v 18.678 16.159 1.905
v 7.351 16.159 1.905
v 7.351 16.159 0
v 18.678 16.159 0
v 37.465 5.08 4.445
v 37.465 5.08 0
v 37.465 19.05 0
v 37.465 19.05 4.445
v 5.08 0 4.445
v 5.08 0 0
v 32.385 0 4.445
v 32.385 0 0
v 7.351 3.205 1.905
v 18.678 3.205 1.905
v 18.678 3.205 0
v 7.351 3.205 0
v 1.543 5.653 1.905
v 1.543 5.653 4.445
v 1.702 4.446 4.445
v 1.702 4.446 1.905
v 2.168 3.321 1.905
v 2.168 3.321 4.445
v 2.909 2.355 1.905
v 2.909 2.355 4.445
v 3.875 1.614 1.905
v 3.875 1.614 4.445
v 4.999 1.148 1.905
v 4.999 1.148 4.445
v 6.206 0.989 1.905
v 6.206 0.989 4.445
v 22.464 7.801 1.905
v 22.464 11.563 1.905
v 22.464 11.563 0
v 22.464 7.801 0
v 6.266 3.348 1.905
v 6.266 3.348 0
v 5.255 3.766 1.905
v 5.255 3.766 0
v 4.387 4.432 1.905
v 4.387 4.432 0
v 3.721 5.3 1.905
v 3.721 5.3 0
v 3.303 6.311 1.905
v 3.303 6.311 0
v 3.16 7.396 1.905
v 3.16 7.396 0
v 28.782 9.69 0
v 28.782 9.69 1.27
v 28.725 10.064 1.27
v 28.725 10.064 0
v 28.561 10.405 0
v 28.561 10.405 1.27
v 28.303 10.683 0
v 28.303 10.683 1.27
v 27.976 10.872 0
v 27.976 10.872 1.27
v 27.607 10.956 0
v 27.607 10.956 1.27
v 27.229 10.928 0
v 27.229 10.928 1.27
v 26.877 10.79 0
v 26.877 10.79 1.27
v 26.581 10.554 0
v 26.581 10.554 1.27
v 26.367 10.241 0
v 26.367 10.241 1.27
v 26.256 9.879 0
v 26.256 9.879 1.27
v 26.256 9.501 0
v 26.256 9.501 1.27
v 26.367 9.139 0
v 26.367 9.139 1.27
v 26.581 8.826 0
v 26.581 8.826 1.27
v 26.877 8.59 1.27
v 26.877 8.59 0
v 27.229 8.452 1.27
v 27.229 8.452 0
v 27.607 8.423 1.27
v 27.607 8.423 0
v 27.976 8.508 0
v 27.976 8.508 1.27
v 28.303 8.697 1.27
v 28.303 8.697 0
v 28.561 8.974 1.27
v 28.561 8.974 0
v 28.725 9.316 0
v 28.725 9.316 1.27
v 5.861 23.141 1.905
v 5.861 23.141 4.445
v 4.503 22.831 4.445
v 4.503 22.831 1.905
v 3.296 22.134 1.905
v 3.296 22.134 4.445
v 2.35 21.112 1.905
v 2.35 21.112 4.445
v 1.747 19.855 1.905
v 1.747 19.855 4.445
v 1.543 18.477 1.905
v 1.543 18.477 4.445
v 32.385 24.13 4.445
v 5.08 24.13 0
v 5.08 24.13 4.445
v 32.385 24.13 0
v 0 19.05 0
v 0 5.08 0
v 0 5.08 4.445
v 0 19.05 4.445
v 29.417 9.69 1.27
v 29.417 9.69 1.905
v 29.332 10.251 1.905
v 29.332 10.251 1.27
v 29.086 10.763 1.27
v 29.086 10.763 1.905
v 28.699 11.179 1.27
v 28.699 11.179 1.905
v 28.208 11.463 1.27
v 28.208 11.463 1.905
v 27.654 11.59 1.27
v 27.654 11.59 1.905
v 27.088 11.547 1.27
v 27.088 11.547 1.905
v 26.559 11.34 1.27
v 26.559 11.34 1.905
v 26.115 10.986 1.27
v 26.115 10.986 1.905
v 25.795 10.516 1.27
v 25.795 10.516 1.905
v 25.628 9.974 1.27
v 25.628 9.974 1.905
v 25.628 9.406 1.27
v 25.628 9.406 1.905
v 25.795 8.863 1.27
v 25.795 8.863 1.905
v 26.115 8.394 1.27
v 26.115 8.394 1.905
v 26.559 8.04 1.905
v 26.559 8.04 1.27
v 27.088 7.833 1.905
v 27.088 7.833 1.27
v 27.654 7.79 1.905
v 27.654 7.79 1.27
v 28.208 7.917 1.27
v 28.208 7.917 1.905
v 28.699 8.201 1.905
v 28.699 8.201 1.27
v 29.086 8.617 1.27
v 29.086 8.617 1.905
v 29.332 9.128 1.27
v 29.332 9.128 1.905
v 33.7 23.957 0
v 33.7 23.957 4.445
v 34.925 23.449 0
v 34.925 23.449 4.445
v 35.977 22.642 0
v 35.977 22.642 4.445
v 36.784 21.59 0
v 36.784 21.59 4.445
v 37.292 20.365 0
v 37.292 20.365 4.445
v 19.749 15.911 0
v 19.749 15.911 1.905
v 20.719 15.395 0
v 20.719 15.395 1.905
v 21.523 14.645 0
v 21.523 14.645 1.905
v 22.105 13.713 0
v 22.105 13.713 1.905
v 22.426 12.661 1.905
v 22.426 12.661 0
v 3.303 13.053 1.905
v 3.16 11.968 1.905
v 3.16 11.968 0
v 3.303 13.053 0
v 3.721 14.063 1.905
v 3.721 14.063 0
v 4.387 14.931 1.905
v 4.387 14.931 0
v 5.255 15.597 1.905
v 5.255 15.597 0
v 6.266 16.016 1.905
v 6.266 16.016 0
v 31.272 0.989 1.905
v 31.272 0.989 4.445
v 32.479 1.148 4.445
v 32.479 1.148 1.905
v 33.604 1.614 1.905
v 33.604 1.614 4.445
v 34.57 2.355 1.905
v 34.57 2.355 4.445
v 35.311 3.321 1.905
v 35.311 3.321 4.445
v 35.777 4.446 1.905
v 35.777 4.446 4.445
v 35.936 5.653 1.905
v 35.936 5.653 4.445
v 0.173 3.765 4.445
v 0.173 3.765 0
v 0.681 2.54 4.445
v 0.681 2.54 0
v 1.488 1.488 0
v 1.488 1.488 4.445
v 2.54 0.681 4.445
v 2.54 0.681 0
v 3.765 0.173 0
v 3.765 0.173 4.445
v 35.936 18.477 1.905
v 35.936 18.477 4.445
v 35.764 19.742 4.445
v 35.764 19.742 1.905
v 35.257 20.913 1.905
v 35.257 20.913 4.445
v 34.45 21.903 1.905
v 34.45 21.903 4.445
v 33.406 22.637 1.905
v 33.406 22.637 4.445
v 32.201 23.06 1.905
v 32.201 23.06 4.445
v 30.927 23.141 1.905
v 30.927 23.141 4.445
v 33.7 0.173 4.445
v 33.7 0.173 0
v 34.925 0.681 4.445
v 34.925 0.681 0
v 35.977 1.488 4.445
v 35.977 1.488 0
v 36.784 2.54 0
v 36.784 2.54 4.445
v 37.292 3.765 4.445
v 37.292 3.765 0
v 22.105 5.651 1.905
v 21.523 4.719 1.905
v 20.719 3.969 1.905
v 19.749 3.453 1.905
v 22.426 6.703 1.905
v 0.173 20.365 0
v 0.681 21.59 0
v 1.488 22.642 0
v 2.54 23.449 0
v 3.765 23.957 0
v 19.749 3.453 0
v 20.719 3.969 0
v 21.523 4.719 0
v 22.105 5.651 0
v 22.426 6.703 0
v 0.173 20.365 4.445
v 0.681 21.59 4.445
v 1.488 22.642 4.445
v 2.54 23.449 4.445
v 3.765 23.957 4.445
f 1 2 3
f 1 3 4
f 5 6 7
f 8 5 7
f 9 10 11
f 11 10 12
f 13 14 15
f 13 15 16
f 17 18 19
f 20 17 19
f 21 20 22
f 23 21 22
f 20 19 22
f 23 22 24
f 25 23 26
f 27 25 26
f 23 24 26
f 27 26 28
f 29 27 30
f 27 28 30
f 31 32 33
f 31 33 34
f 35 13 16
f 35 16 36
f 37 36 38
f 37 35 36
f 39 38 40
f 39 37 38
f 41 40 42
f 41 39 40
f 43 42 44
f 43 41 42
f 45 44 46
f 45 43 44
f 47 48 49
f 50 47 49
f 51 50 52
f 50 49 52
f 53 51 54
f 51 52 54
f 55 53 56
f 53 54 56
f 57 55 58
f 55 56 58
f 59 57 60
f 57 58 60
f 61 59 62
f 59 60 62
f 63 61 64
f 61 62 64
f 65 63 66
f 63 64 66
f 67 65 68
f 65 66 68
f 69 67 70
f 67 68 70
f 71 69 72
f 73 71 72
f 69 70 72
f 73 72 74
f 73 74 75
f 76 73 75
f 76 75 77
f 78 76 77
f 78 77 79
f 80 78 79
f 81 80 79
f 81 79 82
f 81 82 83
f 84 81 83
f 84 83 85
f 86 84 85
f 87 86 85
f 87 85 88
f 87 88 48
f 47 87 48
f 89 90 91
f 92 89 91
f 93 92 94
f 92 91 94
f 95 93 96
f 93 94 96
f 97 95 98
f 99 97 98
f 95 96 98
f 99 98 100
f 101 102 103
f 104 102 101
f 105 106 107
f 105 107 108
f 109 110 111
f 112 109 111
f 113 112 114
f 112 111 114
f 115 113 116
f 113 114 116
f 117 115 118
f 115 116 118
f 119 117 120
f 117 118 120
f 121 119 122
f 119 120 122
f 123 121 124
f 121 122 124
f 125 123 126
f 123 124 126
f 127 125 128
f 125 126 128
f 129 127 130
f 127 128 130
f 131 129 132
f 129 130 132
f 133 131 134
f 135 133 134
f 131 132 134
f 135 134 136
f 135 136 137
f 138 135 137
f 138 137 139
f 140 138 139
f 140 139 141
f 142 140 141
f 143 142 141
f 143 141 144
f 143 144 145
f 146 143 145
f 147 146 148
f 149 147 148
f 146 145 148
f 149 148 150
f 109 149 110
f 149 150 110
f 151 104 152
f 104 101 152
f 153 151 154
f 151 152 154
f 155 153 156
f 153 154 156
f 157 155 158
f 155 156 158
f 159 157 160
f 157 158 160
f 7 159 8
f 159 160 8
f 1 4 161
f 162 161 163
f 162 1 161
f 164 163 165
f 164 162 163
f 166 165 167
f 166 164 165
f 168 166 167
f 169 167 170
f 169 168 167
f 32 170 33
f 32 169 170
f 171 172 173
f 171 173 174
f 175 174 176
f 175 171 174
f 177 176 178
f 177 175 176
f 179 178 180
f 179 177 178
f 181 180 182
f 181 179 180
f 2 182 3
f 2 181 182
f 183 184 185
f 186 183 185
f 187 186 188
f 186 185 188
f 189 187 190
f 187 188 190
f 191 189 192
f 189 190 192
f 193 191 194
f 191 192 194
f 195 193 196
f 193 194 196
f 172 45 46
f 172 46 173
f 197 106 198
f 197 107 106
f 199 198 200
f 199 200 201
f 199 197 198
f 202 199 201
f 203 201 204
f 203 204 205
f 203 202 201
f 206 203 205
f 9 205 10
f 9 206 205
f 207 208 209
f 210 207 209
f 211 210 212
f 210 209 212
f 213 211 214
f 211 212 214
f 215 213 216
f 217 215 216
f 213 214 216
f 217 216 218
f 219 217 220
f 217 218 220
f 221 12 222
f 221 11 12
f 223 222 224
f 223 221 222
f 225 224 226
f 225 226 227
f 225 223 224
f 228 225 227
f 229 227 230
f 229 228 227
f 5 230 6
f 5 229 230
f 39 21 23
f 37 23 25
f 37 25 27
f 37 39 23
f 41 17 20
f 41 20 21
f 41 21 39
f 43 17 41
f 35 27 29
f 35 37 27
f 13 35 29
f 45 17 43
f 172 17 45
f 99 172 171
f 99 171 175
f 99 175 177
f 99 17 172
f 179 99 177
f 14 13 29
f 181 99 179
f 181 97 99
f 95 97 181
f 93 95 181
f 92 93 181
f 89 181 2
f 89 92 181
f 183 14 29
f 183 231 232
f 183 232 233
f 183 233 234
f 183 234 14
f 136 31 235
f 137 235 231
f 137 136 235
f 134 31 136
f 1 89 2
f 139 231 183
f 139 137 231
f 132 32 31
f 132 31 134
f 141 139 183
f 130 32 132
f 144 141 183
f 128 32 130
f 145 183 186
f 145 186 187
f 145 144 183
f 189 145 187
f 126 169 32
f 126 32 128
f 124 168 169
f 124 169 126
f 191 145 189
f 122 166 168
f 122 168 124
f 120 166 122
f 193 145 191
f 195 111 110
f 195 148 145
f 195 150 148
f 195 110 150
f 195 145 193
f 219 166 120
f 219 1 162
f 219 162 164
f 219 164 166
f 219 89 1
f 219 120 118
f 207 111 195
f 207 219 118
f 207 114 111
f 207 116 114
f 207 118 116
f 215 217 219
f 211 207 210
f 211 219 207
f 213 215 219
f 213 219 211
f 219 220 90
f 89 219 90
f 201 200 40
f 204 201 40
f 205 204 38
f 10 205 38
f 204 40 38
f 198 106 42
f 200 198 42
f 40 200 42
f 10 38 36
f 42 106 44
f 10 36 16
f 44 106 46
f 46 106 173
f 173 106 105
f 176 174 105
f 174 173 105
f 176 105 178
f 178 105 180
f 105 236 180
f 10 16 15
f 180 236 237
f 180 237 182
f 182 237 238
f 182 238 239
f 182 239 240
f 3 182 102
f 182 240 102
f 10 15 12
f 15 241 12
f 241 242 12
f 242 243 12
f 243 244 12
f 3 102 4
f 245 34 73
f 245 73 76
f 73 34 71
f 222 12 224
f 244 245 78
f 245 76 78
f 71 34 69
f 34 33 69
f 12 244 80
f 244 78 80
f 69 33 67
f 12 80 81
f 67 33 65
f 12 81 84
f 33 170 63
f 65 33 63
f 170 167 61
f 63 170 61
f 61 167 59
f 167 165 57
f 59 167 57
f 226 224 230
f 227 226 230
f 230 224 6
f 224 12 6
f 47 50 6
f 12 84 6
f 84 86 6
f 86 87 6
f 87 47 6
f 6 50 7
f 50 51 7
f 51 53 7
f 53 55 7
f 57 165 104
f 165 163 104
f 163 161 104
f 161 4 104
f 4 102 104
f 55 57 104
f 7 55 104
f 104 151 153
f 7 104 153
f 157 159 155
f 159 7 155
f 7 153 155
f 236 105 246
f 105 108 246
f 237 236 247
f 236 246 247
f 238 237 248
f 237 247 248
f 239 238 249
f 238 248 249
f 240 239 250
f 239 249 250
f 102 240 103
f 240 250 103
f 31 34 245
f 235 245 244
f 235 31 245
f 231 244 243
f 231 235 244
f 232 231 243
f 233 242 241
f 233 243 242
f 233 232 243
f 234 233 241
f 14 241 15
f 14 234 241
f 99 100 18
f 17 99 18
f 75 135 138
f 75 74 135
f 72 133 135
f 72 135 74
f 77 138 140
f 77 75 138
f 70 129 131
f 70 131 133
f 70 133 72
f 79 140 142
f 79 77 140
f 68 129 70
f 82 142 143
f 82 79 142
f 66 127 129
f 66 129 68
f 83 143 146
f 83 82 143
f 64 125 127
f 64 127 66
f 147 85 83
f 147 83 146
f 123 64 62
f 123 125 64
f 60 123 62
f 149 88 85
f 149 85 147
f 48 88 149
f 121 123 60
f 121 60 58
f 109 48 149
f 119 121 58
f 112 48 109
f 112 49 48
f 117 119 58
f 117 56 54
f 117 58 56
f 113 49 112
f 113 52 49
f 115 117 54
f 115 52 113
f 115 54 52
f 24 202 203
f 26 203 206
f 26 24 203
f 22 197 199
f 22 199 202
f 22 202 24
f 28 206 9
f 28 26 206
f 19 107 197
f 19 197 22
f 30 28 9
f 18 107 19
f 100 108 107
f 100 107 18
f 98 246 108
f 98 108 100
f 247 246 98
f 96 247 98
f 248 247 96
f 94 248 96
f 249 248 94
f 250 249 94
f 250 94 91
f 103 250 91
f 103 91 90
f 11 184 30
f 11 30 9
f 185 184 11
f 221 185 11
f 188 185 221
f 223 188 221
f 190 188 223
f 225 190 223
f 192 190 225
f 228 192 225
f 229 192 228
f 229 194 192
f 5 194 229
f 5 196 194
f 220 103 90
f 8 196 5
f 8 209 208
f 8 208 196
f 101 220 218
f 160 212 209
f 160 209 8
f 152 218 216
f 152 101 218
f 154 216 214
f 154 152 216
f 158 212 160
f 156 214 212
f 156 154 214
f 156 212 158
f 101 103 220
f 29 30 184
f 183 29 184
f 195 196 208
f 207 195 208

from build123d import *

# Parameters (mm, degrees)
SKETCH1_W           = 37.465
SKETCH1_H           = 24.13
BOSS_EXTRUDE1_DEPTH = 4.445
CUT_EXTRUDE2_DEPTH  = 2.54
FILLET1_R           = 5.08
CUT_EXTRUDE4_DEPTH  = 2.54
SKETCH4_R           = 1.27
CUT_EXTRUDE5_DEPTH  = 2.54
SKETCH5_R           = 1.905
SKETCH5_R_2         = 1.27
CUT_EXTRUDE6_DEPTH  = 0.635
CUT_EXTRUDE7_DEPTH  = 2.54


with BuildPart() as part:
    # Sketch1 → Boss-Extrude1 (new body)
    with BuildSketch(Plane.XY):
        with Locations((18.7325, 12.065)):
            Rectangle(SKETCH1_W, SKETCH1_H)
    extrude(amount=BOSS_EXTRUDE1_DEPTH)

    # Sketch2 → Cut-Extrude2 (cut)
    # profile 1 of 4: a face of its own
    with BuildSketch(Plane.XY.offset(4.445)):
        with BuildLine():
            Line((35.59175, 5.7785), (35.59175, 12.065))
            Line((35.59175, 12.065), (35.59175, 18.3515))
            ThreePointArc((35.59175, 18.3515), (34.135361545, 21.710109865), (30.681521372, 22.9235))
            Line((30.681521372, 22.9235), (18.7325, 22.9235))
            Line((18.7325, 22.9235), (6.107021372, 22.9235))
            ThreePointArc((6.107021372, 22.9235), (3.090639267, 21.470453234), (1.87325, 18.3515))
            Line((1.87325, 18.3515), (1.87325, 12.065))
            Line((1.87325, 12.065), (1.87325, 5.7785))
            ThreePointArc((1.87325, 5.7785), (3.212357796, 2.545607796), (6.44525, 1.2065))
            Line((6.44525, 1.2065), (18.7325, 1.2065))
            Line((18.7325, 1.2065), (31.01975, 1.2065))
            ThreePointArc((31.01975, 1.2065), (34.252642204, 2.545607796), (35.59175, 5.7785))
        make_face()
        with BuildLine():
            ThreePointArc((7.493, 3.175), (4.439712919, 4.439712919), (3.175, 7.493))
            Line((3.175, 7.493), (3.175, 16.637))
            ThreePointArc((3.175, 16.637), (4.317872951, 19.576666289), (7.154771372, 20.955))
            Line((7.154771372, 20.955), (7.493, 20.955))
            Line((7.493, 20.955), (29.633771372, 20.955))
            ThreePointArc((29.633771372, 20.955), (32.908147923, 19.81638289), (34.29, 16.637))
            Line((34.29, 16.637), (34.29, 7.493))
            ThreePointArc((34.29, 7.493), (33.025287081, 4.439712919), (29.972, 3.175))
            Line((29.972, 3.175), (7.493, 3.175))
        make_face(mode=Mode.SUBTRACT)
    # profile 2 of 4: a face of its own
    with BuildSketch(Plane.XY.offset(4.445)):
        with BuildLine():
            ThreePointArc((3.175, 16.637), (4.439712919, 19.690287081), (7.493, 20.955))
            Line((7.493, 20.955), (29.972, 20.955))
            ThreePointArc((29.972, 20.955), (33.025287081, 19.690287081), (34.29, 16.637))
            Line((34.29, 16.637), (34.29, 7.493))
            ThreePointArc((34.29, 7.493), (33.025287081, 4.439712919), (29.972, 3.175))
            Line((29.972, 3.175), (7.493, 3.175))
            ThreePointArc((7.493, 3.175), (4.439712919, 4.439712919), (3.175, 7.493))
            Line((3.175, 7.493), (3.175, 16.637))
        make_face()
    # profile 3 of 4: a face of its own
    with BuildSketch(Plane.XY.offset(4.445)):
        with BuildLine():
            ThreePointArc((7.154771372, 20.955), (4.317872951, 19.576666289), (3.175, 16.637))
            ThreePointArc((3.175, 16.637), (4.439712919, 19.690287081), (7.493, 20.955))
            Line((7.493, 20.955), (7.154771372, 20.955))
        make_face()
    # profile 4 of 4: a face of its own
    with BuildSketch(Plane.XY.offset(4.445)):
        with BuildLine():
            ThreePointArc((34.29, 16.637), (32.908147923, 19.81638289), (29.633771372, 20.955))
            Line((29.633771372, 20.955), (29.972, 20.955))
            ThreePointArc((29.972, 20.955), (33.025287081, 19.690287081), (34.29, 16.637))
        make_face()
    extrude(amount=-CUT_EXTRUDE2_DEPTH, mode=Mode.SUBTRACT)

    # Fillet1
    fillet1_edges = [part.edges().sort_by_distance(p)[0] for p in [
        (0, 24.13, 2.2225),
        (37.465, 24.13, 2.2225),
        (37.465, 0, 2.2225),
        (0, 0, 2.2225),
    ]]
    fillet(fillet1_edges, radius=FILLET1_R)

    # Sketch3 → Cut-Extrude4 (cut)
    with BuildSketch(Plane.XY.offset(1.905)):
        with BuildLine():
            Line((7.350869654, 16.158973759), (18.677995313, 16.158973759))
            ThreePointArc((18.677995313, 16.158973759), (21.522821275, 14.644991178), (22.463869654, 11.5628481))
            Line((22.463869654, 11.5628481), (22.463869654, 7.801099417))
            ThreePointArc((22.463869654, 7.801099417), (21.522821275, 4.718956339), (18.677995313, 3.204973759))
            Line((18.677995313, 3.204973759), (7.350869654, 3.204973759))
            ThreePointArc((7.350869654, 3.204973759), (4.387385134, 4.432489239), (3.159869654, 7.395973759))
            Line((3.159869654, 7.395973759), (3.159869654, 11.967973759))
            ThreePointArc((3.159869654, 11.967973759), (4.387385134, 14.931458278), (7.350869654, 16.158973759))
        make_face()
    extrude(amount=-CUT_EXTRUDE4_DEPTH, mode=Mode.SUBTRACT)

    # Sketch4 → Cut-Extrude5 (cut)
    with BuildSketch(Plane.XY.offset(1.905)):
        with Locations((27.511650569, 9.68988988)):
            Circle(SKETCH4_R)
    extrude(amount=-CUT_EXTRUDE5_DEPTH, mode=Mode.SUBTRACT)

    # Sketch5 → Cut-Extrude6 (cut)
    with BuildSketch(Plane.XY.offset(1.905)):
        with Locations((27.511650569, 9.68988988)):
            Circle(SKETCH5_R)
        with Locations((27.511650569, 9.68988988)):
            Circle(SKETCH5_R_2, mode=Mode.SUBTRACT)
    extrude(amount=-CUT_EXTRUDE6_DEPTH, mode=Mode.SUBTRACT)

    # Sketch6 → Cut-Extrude7 (cut)
    with BuildSketch(Plane.XY.offset(4.445)):
        with BuildLine():
            Line((1.542829573, 18.47723), (1.542829573, 5.65277))
            ThreePointArc((1.542829573, 5.65277), (2.908719525, 2.355219952), (6.206269573, 0.98933))
            Line((6.206269573, 0.98933), (31.272259573, 0.98933))
            ThreePointArc((31.272259573, 0.98933), (34.56980962, 2.355219952), (35.935699573, 5.65277))
            Line((35.935699573, 5.65277), (35.935699573, 18.47723))
            ThreePointArc((35.935699573, 18.47723), (34.450183348, 21.903012063), (30.927266372, 23.14067))
            Line((30.927266372, 23.14067), (5.861276372, 23.14067))
            ThreePointArc((5.861276372, 23.14067), (2.784566625, 21.658562299), (1.542829573, 18.47723))
        make_face()
        with BuildLine():
            Line((6.44525, 1.2065), (31.01975, 1.2065))
            ThreePointArc((31.01975, 1.2065), (34.252642204, 2.545607796), (35.59175, 5.7785))
            Line((35.59175, 5.7785), (35.59175, 18.3515))
            ThreePointArc((35.59175, 18.3515), (34.135361545, 21.710109865), (30.681521372, 22.9235))
            Line((30.681521372, 22.9235), (6.107021372, 22.9235))
            ThreePointArc((6.107021372, 22.9235), (3.090639267, 21.470453234), (1.87325, 18.3515))
            Line((1.87325, 18.3515), (1.87325, 5.7785))
            ThreePointArc((1.87325, 5.7785), (3.212357796, 2.545607796), (6.44525, 1.2065))
        make_face(mode=Mode.SUBTRACT)
    extrude(amount=-CUT_EXTRUDE7_DEPTH, mode=Mode.SUBTRACT)


solid = part.part
